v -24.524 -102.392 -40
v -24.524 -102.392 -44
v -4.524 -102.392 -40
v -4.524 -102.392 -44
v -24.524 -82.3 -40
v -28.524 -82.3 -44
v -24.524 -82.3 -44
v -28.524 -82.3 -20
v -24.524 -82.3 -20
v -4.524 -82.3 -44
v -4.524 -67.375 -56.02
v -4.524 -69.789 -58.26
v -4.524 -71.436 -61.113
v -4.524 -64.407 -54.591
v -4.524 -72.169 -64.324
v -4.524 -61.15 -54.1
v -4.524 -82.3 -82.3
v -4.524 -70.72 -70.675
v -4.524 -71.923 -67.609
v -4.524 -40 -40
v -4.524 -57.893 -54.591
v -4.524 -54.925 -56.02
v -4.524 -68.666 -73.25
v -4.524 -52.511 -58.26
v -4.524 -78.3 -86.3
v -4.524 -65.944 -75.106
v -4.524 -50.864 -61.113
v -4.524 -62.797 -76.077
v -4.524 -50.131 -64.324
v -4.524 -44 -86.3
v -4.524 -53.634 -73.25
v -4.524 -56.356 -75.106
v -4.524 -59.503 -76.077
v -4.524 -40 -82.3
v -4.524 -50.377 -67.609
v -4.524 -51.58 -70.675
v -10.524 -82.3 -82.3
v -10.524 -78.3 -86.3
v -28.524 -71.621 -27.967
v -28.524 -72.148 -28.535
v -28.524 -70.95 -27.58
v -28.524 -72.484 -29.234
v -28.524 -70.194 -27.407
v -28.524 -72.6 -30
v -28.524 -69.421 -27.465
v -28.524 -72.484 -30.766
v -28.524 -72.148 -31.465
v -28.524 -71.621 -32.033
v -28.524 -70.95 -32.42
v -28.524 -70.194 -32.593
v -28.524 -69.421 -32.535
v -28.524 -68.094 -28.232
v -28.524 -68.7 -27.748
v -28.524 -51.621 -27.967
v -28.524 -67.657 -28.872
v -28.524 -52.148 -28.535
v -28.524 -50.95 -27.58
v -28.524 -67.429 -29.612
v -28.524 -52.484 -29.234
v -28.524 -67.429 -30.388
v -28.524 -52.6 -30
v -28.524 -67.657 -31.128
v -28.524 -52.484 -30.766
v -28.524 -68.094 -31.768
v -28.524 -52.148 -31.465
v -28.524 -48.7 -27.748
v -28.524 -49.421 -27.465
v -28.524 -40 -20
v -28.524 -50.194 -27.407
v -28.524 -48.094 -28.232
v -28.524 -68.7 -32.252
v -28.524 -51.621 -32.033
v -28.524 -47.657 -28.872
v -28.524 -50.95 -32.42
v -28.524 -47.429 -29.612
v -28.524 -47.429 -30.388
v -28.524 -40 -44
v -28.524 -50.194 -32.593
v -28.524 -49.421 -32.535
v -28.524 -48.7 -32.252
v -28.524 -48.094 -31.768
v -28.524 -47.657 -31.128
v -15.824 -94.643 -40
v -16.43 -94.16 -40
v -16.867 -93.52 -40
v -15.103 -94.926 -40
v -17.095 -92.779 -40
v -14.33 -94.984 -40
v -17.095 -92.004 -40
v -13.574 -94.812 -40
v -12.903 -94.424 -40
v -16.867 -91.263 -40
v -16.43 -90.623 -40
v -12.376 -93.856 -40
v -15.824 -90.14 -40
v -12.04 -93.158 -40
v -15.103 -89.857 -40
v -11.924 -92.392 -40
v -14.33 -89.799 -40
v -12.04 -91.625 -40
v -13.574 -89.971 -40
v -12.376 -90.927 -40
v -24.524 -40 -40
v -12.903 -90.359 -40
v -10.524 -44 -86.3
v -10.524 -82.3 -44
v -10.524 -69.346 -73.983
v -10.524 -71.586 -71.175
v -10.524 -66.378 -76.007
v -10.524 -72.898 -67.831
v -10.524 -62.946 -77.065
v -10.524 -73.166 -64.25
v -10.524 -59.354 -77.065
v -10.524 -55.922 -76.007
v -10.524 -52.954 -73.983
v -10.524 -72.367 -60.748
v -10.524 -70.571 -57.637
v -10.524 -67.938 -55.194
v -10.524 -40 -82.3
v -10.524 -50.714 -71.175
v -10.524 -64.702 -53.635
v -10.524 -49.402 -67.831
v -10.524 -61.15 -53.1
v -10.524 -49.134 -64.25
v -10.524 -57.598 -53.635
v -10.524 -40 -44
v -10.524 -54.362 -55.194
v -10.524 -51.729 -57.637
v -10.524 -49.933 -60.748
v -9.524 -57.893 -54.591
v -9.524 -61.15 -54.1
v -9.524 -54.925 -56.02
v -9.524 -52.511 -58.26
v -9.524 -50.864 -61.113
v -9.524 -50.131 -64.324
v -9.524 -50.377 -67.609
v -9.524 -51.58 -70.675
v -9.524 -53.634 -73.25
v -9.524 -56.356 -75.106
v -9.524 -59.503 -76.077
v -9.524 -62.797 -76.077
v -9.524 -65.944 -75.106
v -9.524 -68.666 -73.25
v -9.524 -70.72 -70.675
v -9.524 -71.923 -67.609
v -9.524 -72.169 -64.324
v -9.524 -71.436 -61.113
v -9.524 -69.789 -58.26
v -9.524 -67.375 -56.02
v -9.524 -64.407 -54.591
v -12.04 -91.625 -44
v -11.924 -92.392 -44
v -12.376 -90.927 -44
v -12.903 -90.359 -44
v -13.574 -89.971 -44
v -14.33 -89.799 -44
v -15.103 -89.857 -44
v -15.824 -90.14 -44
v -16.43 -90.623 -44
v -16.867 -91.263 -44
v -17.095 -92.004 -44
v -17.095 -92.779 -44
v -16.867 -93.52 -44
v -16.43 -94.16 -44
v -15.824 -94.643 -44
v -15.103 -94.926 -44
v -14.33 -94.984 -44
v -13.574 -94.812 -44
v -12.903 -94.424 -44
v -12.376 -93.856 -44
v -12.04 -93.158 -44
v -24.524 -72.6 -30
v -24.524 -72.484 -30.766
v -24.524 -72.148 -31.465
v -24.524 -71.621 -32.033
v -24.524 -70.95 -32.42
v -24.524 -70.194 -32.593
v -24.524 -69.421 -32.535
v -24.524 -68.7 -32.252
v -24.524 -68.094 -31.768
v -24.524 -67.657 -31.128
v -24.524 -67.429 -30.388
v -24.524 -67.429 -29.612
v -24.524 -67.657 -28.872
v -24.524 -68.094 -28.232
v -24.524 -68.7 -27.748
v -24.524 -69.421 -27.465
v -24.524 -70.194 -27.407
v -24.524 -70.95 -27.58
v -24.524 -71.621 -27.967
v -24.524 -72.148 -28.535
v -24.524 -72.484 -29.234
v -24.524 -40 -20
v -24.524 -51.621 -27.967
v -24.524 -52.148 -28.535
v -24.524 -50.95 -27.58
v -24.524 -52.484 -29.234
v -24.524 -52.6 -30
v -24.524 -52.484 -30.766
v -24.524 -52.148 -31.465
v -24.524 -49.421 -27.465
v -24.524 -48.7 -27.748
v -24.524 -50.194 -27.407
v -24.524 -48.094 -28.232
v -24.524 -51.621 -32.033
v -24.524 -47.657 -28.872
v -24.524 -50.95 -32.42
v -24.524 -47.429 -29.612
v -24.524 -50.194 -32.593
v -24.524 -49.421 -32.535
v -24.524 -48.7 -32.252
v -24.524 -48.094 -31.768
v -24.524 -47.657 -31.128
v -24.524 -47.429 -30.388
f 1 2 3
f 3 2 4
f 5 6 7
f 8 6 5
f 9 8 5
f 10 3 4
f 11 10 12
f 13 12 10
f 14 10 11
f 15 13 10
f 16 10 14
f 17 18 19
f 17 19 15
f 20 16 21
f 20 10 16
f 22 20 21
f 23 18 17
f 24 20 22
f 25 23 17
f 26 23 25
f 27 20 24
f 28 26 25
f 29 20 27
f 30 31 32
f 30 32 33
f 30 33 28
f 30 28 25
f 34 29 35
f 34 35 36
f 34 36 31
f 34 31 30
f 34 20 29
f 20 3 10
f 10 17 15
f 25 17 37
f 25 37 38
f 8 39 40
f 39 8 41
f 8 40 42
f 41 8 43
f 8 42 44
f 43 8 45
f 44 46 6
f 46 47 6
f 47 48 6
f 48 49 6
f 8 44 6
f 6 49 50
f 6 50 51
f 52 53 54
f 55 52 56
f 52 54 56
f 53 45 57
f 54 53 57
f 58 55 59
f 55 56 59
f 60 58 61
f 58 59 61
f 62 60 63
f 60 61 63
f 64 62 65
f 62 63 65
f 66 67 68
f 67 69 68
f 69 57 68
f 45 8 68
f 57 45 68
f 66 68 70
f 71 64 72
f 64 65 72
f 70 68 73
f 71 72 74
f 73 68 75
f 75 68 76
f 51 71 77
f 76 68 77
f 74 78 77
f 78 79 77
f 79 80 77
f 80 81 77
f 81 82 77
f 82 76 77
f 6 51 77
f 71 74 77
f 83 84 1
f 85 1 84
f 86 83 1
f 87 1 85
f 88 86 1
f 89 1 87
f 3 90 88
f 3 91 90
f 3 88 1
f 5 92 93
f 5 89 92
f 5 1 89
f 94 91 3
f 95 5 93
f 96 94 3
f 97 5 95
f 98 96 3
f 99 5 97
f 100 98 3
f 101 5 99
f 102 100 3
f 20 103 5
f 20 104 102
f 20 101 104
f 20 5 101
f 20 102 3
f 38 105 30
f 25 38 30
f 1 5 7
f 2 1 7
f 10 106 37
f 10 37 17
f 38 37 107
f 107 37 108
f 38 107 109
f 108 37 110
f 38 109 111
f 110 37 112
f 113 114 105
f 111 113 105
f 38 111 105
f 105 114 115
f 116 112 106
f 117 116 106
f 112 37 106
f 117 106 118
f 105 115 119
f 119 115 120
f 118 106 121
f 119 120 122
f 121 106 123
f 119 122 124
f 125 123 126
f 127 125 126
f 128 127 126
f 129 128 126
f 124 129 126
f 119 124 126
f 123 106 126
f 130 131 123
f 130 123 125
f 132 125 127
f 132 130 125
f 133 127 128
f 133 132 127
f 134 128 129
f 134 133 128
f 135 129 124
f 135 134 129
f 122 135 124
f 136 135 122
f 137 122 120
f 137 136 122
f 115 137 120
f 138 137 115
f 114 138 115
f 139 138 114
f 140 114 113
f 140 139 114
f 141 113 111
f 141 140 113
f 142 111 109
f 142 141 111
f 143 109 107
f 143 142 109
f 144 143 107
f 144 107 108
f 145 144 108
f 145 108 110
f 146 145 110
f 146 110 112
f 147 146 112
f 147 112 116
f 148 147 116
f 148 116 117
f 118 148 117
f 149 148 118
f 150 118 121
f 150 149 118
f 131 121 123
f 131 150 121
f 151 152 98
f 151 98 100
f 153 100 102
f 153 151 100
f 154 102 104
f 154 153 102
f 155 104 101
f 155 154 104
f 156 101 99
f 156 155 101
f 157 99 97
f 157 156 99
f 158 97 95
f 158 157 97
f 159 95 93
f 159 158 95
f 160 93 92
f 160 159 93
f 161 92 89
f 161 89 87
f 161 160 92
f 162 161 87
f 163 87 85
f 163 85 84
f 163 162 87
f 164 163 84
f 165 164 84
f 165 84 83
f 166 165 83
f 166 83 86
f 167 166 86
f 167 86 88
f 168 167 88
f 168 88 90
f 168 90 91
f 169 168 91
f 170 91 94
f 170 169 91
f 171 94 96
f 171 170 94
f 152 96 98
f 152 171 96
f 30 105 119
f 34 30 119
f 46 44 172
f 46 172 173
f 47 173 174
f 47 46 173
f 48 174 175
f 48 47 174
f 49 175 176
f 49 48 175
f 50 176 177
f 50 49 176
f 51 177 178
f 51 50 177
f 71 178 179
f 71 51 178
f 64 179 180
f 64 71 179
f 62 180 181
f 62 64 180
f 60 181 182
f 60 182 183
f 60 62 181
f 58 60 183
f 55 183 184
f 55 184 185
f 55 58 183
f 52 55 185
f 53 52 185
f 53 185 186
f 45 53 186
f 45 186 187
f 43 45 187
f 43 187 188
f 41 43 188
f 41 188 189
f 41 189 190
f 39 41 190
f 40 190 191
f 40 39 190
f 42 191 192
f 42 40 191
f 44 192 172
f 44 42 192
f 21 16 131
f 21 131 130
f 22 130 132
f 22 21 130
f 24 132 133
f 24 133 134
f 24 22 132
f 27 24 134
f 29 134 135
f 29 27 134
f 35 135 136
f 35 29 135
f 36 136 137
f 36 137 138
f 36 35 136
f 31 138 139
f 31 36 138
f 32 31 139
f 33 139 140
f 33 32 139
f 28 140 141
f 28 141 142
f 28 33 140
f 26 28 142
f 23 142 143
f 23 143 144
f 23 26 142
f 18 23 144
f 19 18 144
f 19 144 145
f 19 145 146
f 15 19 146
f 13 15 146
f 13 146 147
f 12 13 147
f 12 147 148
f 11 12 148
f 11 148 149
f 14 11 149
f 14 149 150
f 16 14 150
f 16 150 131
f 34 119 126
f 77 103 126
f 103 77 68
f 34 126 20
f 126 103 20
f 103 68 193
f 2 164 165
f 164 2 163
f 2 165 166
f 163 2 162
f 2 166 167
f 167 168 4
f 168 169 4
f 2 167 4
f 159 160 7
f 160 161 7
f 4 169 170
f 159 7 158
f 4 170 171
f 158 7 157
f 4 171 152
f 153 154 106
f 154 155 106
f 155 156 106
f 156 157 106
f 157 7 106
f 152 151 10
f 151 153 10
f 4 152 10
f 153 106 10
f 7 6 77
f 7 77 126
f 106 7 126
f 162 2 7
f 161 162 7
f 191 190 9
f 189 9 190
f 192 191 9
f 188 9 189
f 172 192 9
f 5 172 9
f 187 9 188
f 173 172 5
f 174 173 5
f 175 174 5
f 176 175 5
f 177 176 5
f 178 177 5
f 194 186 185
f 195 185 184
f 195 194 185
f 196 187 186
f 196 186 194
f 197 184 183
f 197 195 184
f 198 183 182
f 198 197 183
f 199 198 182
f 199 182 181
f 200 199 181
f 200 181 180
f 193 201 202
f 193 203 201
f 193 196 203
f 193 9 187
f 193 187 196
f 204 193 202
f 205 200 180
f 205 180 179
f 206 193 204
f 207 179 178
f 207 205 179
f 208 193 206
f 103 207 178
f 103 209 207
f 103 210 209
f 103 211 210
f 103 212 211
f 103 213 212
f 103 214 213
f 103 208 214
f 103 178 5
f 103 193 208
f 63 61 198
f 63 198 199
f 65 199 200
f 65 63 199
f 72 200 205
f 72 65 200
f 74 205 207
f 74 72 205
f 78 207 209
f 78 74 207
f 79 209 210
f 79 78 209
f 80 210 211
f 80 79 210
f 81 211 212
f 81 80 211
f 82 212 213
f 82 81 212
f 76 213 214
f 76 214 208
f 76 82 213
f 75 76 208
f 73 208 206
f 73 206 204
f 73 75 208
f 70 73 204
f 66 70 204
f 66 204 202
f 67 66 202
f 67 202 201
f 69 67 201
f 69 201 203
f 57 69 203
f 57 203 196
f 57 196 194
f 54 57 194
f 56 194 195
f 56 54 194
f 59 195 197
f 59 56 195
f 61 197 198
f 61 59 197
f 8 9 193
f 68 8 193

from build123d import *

# Parameters (mm, degrees)
SKICA2_W                 = 20
SKICA2_H                 = 42.3
P_IDAT_VYSUNUT_M1_DEPTH  = 4
SKICA3_W                 = 24
SKICA3_H                 = 42.3
P_IDAT_VYSUNUT_M2_DEPTH  = 4
SKICA4_W                 = 6
SKICA4_H                 = 42.3
P_IDAT_VYSUNUT_M3_DEPTH  = 42.3
SKICA5_R                 = 11.05
ODEBRAT_VYSUNUT_M1_DEPTH = 7
SKICA7_R                 = 2.6
ODEBRAT_VYSUNUT_M3_DEPTH = 4
ZKOSEN_1_SIZE            = 1
SKICA8_W                 = 20
SKICA8_H                 = 4
P_IDAT_VYSUNUT_M4_DEPTH  = 20.091596743
SKICA9_R                 = 2.6
ODEBRAT_VYSUNUT_M4_DEPTH = 4
ODEBRAT_VYSUNUT_M5_DEPTH = 80
SKICA11_W                = 84.692176523
SKICA11_H                = 80.474242756
ODEBRAT_VYSUNUT_M6_DEPTH = 24


with BuildPart() as part:
    # Skica2 → Přidat vysunutím1 (new body)
    with BuildSketch(Plane.XY):
        with Locations((-14.524287798, -61.15)):
            Rectangle(SKICA2_W, SKICA2_H)
    extrude(amount=P_IDAT_VYSUNUT_M1_DEPTH)

    # Skica3 → Přidat vysunutím2 (add)
    with BuildSketch(Plane.ZY.offset(24.524287798)):
        with Locations((-8, -61.15)):
            Rectangle(SKICA3_W, SKICA3_H)
    extrude(amount=P_IDAT_VYSUNUT_M2_DEPTH)

    # Skica4 → Přidat vysunutím3 (add)
    with BuildSketch(Plane.XY.offset(4)):
        with Locations((-7.524287798, -61.15)):
            Rectangle(SKICA4_W, SKICA4_H)
    extrude(amount=P_IDAT_VYSUNUT_M3_DEPTH)

    # Skica5 → Odebrat vysunutím1 (cut)
    with BuildSketch(Plane(origin=(-4.524287798, 0, 0), x_dir=(0, 0, -1), z_dir=(1, 0, 0))):
        with Locations((-25.15, -61.15)):
            Circle(SKICA5_R)
    extrude(amount=-ODEBRAT_VYSUNUT_M1_DEPTH, mode=Mode.SUBTRACT)

    # Skica7 → Odebrat vysunutím3 (cut)
    with BuildSketch(Plane.ZY.offset(28.524287798)):
        with Locations(Location((-10, -50, 0), (0, 0, 270))):
            Circle(SKICA7_R)
        with Locations(Location((-10, -70, 0), (0, 0, 270))):
            Circle(SKICA7_R)
    extrude(amount=-ODEBRAT_VYSUNUT_M3_DEPTH, mode=Mode.SUBTRACT)

    # Zkosení1
    zkosen_1_edges = [part.edges().sort_by_distance(p)[0] for p in [
        (-10.524287798, -61.15, 36.2),
    ]]
    chamfer(zkosen_1_edges, length=ZKOSEN_1_SIZE)

    # Skica8 → Přidat vysunutím4 (add)
    with BuildSketch(Plane.XZ.offset(82.3)):
        with Locations((-14.524287798, 2)):
            Rectangle(SKICA8_W, SKICA8_H)
    extrude(amount=P_IDAT_VYSUNUT_M4_DEPTH)

    # Skica9 → Odebrat vysunutím4 (cut)
    with BuildSketch(Plane.XY.offset(4)):
        with Locations((-14.524287798, -92.391596743)):
            Circle(SKICA9_R)
    extrude(amount=-ODEBRAT_VYSUNUT_M4_DEPTH, mode=Mode.SUBTRACT)

    # Skica10 → Odebrat vysunutím5 (cut)
    with BuildSketch(Plane.ZY.offset(10.524287798)):
        Polygon((46.3, -44), (42.3, -40), (46.565878614, -39.259270079), align=None)
        Polygon((42.3, -82.3), (46.3, -78.3), (47.745576453, -80.3), (46.3, -85.415433185), align=None)
    extrude(amount=-ODEBRAT_VYSUNUT_M5_DEPTH, mode=Mode.SUBTRACT)


with BuildPart() as body_2:
    # Zrcadlit1: mirrored copy
    add(part.part.mirror(Plane(origin=(-28.524287798, -40, -20), x_dir=(1, 0, 0), z_dir=(0, 0, 1))))


with BuildPart() as part_1:
    add(part.part)

    # Skica11 → Odebrat vysunutím6 (cut)
    with BuildSketch(Plane.ZY.offset(28.524287798)):
        with Locations((22.346088262, -80.237121378)):
            Rectangle(SKICA11_W, SKICA11_H)
    extrude(amount=-ODEBRAT_VYSUNUT_M6_DEPTH, mode=Mode.SUBTRACT)


solid = body_2.part
